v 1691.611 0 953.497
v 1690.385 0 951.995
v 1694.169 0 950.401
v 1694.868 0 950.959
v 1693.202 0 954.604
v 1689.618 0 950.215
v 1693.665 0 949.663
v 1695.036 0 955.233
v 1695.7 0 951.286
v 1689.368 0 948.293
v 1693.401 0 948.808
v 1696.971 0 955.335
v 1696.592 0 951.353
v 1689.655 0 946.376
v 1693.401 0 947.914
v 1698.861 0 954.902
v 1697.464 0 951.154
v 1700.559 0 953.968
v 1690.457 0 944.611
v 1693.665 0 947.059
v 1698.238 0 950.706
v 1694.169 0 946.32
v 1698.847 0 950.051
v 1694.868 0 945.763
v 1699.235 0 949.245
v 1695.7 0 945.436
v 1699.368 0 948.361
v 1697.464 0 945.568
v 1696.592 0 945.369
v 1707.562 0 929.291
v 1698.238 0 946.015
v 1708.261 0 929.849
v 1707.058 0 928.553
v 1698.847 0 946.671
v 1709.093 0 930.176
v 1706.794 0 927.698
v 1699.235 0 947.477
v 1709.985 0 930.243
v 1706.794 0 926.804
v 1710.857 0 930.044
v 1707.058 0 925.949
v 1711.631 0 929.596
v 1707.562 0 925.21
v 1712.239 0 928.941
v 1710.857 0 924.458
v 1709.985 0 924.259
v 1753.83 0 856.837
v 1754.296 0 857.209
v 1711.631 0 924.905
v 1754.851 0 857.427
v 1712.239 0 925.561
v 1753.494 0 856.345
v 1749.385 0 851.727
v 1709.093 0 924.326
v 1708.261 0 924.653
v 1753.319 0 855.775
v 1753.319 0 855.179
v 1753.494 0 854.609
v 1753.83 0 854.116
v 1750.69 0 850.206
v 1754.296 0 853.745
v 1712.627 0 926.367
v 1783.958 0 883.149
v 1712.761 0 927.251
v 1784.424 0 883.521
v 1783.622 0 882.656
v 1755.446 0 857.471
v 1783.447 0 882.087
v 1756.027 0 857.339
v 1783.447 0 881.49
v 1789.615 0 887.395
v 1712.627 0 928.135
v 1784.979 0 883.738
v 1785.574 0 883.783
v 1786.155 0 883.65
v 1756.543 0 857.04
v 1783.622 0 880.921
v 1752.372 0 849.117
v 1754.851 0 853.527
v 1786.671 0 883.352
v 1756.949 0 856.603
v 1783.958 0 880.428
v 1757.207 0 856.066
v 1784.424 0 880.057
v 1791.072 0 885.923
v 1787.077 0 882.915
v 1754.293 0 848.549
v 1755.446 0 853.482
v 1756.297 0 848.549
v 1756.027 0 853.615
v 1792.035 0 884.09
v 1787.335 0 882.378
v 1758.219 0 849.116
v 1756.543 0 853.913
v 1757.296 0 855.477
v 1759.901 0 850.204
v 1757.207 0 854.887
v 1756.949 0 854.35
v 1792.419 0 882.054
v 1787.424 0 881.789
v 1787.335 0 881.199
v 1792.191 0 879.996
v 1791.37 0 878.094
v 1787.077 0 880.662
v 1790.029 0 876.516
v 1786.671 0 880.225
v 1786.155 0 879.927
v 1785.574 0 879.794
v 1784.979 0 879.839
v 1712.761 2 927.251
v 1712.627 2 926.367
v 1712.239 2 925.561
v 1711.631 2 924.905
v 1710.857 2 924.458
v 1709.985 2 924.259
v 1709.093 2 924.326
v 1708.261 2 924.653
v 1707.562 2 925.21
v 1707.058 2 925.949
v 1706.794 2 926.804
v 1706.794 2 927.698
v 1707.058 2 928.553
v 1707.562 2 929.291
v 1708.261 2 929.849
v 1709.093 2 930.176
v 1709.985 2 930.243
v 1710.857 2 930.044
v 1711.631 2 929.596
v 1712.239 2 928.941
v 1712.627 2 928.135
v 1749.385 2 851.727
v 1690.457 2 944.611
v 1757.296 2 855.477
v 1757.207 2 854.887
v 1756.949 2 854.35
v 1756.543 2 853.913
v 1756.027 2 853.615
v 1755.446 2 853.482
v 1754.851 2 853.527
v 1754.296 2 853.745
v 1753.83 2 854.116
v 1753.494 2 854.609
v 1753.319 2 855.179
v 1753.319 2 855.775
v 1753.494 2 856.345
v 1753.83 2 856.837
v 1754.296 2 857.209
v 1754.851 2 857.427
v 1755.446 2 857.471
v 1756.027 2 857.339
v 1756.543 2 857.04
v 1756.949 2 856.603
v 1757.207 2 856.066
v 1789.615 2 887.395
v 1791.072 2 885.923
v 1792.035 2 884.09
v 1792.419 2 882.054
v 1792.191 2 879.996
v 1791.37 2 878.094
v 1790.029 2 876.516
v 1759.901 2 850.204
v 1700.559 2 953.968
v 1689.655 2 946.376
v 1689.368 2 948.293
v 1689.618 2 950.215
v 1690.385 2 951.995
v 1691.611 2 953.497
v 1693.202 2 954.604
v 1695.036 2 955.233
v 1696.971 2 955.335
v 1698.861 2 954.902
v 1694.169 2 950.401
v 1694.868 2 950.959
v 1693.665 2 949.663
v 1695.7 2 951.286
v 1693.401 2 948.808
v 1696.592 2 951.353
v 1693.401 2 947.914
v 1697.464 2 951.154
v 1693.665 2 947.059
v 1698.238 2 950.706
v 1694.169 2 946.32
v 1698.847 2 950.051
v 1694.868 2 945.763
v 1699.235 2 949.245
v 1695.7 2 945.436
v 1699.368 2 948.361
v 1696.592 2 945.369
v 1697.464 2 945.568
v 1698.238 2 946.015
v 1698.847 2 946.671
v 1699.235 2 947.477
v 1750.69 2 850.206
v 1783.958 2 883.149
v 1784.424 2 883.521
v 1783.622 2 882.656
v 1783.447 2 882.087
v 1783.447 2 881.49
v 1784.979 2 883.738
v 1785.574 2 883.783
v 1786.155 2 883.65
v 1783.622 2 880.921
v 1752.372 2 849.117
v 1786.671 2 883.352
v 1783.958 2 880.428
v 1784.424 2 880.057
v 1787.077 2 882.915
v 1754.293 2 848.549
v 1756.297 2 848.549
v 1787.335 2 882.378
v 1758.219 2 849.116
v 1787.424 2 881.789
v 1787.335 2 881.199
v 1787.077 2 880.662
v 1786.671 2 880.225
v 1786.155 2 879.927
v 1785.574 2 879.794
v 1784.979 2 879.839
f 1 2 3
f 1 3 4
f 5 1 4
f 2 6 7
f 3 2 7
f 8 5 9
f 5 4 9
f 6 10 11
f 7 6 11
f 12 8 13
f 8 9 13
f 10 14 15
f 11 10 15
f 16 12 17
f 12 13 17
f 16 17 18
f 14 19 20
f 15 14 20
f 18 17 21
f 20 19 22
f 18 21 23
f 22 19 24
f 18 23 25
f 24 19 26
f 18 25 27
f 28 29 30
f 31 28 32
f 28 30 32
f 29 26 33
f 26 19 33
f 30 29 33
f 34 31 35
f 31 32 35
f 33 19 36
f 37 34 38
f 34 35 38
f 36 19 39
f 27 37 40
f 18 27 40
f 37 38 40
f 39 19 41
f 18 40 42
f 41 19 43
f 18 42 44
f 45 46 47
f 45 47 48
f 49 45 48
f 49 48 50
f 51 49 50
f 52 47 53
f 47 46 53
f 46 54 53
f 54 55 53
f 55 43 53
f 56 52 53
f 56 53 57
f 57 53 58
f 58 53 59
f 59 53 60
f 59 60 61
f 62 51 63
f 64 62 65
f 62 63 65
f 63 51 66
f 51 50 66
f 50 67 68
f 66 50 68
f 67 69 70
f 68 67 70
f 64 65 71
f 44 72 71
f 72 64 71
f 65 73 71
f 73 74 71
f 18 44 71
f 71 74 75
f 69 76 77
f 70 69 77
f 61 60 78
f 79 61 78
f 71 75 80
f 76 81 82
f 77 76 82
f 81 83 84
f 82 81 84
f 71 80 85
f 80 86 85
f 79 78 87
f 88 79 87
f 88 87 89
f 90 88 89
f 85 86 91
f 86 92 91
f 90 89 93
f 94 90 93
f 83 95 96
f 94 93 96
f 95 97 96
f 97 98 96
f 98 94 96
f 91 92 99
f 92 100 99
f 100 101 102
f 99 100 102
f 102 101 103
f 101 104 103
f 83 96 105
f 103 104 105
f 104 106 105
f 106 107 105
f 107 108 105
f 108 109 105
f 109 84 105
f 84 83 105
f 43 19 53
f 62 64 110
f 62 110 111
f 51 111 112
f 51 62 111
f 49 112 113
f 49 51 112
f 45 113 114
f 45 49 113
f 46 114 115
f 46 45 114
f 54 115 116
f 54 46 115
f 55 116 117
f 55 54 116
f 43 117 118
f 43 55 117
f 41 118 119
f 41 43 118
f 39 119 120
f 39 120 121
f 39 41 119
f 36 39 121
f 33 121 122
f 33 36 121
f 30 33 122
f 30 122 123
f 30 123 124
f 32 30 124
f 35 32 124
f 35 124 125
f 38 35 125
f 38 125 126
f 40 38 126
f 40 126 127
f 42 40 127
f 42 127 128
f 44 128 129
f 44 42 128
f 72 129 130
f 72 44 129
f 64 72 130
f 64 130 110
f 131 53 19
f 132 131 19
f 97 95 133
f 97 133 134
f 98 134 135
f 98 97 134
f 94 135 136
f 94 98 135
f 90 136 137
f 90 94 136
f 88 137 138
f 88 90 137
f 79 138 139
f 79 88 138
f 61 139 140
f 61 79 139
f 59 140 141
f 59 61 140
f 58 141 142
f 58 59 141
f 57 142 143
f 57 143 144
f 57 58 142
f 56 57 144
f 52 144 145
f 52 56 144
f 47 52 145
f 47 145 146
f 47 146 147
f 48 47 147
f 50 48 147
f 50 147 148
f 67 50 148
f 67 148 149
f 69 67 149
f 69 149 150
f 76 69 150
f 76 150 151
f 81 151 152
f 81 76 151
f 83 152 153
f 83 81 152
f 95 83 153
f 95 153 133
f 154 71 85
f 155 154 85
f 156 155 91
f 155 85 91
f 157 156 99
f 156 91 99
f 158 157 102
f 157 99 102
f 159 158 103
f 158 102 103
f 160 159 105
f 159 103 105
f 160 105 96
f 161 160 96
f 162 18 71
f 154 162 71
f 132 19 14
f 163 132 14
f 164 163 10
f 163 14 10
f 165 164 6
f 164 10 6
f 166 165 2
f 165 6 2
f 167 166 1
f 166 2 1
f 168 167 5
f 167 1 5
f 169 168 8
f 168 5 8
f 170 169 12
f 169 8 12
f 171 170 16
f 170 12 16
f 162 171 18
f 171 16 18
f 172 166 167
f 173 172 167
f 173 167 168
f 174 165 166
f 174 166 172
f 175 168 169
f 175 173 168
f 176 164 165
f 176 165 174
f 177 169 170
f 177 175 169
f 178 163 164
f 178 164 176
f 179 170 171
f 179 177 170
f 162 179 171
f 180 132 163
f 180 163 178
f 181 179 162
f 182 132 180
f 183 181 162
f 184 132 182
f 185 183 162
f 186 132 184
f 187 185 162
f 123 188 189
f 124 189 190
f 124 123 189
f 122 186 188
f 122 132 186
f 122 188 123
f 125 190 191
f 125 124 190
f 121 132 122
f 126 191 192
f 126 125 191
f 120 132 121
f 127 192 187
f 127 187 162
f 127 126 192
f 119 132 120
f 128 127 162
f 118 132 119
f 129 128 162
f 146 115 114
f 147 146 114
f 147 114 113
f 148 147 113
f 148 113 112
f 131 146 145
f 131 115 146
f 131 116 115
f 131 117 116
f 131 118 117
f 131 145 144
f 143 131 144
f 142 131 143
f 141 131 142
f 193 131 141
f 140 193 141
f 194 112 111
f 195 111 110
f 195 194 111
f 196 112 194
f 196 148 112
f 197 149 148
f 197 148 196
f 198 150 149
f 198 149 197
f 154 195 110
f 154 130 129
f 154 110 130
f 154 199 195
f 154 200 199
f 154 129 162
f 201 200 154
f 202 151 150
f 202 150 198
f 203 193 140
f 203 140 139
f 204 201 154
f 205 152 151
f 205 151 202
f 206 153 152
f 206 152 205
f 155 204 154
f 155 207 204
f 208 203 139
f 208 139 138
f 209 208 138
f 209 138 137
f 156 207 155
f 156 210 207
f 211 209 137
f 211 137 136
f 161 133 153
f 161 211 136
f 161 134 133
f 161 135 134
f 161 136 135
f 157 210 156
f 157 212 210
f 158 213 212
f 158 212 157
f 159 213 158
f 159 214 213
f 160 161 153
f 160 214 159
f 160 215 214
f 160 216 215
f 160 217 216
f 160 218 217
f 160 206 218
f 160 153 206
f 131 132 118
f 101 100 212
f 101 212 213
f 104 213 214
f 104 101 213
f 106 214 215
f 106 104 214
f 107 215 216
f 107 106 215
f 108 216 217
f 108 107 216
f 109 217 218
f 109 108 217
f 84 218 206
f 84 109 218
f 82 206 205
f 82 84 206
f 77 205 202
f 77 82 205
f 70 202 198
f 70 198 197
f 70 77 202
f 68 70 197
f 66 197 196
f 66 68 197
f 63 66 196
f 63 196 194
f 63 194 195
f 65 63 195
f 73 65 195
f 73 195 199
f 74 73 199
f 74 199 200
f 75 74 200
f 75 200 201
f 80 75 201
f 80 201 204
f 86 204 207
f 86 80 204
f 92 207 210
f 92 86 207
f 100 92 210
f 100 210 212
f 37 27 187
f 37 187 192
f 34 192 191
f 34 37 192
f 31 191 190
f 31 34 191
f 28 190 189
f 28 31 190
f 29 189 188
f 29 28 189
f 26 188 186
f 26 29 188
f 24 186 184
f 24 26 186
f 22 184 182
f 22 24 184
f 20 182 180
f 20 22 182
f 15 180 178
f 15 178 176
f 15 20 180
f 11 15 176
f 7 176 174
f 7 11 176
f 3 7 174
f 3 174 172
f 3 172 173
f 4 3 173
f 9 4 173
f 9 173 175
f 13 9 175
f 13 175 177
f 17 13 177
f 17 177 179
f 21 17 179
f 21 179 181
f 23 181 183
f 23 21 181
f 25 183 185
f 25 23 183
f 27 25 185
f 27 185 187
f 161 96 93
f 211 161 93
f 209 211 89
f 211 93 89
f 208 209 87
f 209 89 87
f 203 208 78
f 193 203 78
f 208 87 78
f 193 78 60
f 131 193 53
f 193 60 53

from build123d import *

# Parameters (mm, degrees)
SZKIC1_R                    = 2
SZKIC1_R_2                  = 3
DODANIE_WYCI_GNI_CIE1_DEPTH = 2


with BuildPart() as part:
    # Szkic1 → Dodanie-wyciągnięcie1 (new body)
    with BuildSketch(Plane(origin=(0, 0, 0), x_dir=(1, 0, 0), z_dir=(0, 1, 0))):
        with BuildLine():
            Line((1700.559122815, -953.967589017), (1789.615327329, -887.395203569))
            ThreePointArc((1789.615327329, -887.395203569), (1792.419138662, -882.05438434), (1790.028740764, -876.516180127))
            Line((1790.028740764, -876.516180127), (1759.900801977, -850.204446919))
            ThreePointArc((1759.900801977, -850.204446919), (1754.293249598, -848.549066517), (1749.385441114, -851.726855661))
            Line((1749.385441114, -851.726855661), (1690.457175388, -944.610974317))
            ThreePointArc((1690.457175388, -944.610974317), (1691.611316681, -953.496529428), (1700.559122815, -953.967589017))
        make_face()
        with Locations((1755.296248665, -855.476836207)):
            Circle(SZKIC1_R, mode=Mode.SUBTRACT)
        with Locations((1785.424187453, -881.788569415)):
            Circle(SZKIC1_R, mode=Mode.SUBTRACT)
        with Locations((1696.367982939, -948.360954863)):
            Circle(SZKIC1_R_2, mode=Mode.SUBTRACT)
        with Locations((1709.760770604, -927.250927896)):
            Circle(SZKIC1_R_2, mode=Mode.SUBTRACT)
    extrude(amount=DODANIE_WYCI_GNI_CIE1_DEPTH)


solid = part.part
